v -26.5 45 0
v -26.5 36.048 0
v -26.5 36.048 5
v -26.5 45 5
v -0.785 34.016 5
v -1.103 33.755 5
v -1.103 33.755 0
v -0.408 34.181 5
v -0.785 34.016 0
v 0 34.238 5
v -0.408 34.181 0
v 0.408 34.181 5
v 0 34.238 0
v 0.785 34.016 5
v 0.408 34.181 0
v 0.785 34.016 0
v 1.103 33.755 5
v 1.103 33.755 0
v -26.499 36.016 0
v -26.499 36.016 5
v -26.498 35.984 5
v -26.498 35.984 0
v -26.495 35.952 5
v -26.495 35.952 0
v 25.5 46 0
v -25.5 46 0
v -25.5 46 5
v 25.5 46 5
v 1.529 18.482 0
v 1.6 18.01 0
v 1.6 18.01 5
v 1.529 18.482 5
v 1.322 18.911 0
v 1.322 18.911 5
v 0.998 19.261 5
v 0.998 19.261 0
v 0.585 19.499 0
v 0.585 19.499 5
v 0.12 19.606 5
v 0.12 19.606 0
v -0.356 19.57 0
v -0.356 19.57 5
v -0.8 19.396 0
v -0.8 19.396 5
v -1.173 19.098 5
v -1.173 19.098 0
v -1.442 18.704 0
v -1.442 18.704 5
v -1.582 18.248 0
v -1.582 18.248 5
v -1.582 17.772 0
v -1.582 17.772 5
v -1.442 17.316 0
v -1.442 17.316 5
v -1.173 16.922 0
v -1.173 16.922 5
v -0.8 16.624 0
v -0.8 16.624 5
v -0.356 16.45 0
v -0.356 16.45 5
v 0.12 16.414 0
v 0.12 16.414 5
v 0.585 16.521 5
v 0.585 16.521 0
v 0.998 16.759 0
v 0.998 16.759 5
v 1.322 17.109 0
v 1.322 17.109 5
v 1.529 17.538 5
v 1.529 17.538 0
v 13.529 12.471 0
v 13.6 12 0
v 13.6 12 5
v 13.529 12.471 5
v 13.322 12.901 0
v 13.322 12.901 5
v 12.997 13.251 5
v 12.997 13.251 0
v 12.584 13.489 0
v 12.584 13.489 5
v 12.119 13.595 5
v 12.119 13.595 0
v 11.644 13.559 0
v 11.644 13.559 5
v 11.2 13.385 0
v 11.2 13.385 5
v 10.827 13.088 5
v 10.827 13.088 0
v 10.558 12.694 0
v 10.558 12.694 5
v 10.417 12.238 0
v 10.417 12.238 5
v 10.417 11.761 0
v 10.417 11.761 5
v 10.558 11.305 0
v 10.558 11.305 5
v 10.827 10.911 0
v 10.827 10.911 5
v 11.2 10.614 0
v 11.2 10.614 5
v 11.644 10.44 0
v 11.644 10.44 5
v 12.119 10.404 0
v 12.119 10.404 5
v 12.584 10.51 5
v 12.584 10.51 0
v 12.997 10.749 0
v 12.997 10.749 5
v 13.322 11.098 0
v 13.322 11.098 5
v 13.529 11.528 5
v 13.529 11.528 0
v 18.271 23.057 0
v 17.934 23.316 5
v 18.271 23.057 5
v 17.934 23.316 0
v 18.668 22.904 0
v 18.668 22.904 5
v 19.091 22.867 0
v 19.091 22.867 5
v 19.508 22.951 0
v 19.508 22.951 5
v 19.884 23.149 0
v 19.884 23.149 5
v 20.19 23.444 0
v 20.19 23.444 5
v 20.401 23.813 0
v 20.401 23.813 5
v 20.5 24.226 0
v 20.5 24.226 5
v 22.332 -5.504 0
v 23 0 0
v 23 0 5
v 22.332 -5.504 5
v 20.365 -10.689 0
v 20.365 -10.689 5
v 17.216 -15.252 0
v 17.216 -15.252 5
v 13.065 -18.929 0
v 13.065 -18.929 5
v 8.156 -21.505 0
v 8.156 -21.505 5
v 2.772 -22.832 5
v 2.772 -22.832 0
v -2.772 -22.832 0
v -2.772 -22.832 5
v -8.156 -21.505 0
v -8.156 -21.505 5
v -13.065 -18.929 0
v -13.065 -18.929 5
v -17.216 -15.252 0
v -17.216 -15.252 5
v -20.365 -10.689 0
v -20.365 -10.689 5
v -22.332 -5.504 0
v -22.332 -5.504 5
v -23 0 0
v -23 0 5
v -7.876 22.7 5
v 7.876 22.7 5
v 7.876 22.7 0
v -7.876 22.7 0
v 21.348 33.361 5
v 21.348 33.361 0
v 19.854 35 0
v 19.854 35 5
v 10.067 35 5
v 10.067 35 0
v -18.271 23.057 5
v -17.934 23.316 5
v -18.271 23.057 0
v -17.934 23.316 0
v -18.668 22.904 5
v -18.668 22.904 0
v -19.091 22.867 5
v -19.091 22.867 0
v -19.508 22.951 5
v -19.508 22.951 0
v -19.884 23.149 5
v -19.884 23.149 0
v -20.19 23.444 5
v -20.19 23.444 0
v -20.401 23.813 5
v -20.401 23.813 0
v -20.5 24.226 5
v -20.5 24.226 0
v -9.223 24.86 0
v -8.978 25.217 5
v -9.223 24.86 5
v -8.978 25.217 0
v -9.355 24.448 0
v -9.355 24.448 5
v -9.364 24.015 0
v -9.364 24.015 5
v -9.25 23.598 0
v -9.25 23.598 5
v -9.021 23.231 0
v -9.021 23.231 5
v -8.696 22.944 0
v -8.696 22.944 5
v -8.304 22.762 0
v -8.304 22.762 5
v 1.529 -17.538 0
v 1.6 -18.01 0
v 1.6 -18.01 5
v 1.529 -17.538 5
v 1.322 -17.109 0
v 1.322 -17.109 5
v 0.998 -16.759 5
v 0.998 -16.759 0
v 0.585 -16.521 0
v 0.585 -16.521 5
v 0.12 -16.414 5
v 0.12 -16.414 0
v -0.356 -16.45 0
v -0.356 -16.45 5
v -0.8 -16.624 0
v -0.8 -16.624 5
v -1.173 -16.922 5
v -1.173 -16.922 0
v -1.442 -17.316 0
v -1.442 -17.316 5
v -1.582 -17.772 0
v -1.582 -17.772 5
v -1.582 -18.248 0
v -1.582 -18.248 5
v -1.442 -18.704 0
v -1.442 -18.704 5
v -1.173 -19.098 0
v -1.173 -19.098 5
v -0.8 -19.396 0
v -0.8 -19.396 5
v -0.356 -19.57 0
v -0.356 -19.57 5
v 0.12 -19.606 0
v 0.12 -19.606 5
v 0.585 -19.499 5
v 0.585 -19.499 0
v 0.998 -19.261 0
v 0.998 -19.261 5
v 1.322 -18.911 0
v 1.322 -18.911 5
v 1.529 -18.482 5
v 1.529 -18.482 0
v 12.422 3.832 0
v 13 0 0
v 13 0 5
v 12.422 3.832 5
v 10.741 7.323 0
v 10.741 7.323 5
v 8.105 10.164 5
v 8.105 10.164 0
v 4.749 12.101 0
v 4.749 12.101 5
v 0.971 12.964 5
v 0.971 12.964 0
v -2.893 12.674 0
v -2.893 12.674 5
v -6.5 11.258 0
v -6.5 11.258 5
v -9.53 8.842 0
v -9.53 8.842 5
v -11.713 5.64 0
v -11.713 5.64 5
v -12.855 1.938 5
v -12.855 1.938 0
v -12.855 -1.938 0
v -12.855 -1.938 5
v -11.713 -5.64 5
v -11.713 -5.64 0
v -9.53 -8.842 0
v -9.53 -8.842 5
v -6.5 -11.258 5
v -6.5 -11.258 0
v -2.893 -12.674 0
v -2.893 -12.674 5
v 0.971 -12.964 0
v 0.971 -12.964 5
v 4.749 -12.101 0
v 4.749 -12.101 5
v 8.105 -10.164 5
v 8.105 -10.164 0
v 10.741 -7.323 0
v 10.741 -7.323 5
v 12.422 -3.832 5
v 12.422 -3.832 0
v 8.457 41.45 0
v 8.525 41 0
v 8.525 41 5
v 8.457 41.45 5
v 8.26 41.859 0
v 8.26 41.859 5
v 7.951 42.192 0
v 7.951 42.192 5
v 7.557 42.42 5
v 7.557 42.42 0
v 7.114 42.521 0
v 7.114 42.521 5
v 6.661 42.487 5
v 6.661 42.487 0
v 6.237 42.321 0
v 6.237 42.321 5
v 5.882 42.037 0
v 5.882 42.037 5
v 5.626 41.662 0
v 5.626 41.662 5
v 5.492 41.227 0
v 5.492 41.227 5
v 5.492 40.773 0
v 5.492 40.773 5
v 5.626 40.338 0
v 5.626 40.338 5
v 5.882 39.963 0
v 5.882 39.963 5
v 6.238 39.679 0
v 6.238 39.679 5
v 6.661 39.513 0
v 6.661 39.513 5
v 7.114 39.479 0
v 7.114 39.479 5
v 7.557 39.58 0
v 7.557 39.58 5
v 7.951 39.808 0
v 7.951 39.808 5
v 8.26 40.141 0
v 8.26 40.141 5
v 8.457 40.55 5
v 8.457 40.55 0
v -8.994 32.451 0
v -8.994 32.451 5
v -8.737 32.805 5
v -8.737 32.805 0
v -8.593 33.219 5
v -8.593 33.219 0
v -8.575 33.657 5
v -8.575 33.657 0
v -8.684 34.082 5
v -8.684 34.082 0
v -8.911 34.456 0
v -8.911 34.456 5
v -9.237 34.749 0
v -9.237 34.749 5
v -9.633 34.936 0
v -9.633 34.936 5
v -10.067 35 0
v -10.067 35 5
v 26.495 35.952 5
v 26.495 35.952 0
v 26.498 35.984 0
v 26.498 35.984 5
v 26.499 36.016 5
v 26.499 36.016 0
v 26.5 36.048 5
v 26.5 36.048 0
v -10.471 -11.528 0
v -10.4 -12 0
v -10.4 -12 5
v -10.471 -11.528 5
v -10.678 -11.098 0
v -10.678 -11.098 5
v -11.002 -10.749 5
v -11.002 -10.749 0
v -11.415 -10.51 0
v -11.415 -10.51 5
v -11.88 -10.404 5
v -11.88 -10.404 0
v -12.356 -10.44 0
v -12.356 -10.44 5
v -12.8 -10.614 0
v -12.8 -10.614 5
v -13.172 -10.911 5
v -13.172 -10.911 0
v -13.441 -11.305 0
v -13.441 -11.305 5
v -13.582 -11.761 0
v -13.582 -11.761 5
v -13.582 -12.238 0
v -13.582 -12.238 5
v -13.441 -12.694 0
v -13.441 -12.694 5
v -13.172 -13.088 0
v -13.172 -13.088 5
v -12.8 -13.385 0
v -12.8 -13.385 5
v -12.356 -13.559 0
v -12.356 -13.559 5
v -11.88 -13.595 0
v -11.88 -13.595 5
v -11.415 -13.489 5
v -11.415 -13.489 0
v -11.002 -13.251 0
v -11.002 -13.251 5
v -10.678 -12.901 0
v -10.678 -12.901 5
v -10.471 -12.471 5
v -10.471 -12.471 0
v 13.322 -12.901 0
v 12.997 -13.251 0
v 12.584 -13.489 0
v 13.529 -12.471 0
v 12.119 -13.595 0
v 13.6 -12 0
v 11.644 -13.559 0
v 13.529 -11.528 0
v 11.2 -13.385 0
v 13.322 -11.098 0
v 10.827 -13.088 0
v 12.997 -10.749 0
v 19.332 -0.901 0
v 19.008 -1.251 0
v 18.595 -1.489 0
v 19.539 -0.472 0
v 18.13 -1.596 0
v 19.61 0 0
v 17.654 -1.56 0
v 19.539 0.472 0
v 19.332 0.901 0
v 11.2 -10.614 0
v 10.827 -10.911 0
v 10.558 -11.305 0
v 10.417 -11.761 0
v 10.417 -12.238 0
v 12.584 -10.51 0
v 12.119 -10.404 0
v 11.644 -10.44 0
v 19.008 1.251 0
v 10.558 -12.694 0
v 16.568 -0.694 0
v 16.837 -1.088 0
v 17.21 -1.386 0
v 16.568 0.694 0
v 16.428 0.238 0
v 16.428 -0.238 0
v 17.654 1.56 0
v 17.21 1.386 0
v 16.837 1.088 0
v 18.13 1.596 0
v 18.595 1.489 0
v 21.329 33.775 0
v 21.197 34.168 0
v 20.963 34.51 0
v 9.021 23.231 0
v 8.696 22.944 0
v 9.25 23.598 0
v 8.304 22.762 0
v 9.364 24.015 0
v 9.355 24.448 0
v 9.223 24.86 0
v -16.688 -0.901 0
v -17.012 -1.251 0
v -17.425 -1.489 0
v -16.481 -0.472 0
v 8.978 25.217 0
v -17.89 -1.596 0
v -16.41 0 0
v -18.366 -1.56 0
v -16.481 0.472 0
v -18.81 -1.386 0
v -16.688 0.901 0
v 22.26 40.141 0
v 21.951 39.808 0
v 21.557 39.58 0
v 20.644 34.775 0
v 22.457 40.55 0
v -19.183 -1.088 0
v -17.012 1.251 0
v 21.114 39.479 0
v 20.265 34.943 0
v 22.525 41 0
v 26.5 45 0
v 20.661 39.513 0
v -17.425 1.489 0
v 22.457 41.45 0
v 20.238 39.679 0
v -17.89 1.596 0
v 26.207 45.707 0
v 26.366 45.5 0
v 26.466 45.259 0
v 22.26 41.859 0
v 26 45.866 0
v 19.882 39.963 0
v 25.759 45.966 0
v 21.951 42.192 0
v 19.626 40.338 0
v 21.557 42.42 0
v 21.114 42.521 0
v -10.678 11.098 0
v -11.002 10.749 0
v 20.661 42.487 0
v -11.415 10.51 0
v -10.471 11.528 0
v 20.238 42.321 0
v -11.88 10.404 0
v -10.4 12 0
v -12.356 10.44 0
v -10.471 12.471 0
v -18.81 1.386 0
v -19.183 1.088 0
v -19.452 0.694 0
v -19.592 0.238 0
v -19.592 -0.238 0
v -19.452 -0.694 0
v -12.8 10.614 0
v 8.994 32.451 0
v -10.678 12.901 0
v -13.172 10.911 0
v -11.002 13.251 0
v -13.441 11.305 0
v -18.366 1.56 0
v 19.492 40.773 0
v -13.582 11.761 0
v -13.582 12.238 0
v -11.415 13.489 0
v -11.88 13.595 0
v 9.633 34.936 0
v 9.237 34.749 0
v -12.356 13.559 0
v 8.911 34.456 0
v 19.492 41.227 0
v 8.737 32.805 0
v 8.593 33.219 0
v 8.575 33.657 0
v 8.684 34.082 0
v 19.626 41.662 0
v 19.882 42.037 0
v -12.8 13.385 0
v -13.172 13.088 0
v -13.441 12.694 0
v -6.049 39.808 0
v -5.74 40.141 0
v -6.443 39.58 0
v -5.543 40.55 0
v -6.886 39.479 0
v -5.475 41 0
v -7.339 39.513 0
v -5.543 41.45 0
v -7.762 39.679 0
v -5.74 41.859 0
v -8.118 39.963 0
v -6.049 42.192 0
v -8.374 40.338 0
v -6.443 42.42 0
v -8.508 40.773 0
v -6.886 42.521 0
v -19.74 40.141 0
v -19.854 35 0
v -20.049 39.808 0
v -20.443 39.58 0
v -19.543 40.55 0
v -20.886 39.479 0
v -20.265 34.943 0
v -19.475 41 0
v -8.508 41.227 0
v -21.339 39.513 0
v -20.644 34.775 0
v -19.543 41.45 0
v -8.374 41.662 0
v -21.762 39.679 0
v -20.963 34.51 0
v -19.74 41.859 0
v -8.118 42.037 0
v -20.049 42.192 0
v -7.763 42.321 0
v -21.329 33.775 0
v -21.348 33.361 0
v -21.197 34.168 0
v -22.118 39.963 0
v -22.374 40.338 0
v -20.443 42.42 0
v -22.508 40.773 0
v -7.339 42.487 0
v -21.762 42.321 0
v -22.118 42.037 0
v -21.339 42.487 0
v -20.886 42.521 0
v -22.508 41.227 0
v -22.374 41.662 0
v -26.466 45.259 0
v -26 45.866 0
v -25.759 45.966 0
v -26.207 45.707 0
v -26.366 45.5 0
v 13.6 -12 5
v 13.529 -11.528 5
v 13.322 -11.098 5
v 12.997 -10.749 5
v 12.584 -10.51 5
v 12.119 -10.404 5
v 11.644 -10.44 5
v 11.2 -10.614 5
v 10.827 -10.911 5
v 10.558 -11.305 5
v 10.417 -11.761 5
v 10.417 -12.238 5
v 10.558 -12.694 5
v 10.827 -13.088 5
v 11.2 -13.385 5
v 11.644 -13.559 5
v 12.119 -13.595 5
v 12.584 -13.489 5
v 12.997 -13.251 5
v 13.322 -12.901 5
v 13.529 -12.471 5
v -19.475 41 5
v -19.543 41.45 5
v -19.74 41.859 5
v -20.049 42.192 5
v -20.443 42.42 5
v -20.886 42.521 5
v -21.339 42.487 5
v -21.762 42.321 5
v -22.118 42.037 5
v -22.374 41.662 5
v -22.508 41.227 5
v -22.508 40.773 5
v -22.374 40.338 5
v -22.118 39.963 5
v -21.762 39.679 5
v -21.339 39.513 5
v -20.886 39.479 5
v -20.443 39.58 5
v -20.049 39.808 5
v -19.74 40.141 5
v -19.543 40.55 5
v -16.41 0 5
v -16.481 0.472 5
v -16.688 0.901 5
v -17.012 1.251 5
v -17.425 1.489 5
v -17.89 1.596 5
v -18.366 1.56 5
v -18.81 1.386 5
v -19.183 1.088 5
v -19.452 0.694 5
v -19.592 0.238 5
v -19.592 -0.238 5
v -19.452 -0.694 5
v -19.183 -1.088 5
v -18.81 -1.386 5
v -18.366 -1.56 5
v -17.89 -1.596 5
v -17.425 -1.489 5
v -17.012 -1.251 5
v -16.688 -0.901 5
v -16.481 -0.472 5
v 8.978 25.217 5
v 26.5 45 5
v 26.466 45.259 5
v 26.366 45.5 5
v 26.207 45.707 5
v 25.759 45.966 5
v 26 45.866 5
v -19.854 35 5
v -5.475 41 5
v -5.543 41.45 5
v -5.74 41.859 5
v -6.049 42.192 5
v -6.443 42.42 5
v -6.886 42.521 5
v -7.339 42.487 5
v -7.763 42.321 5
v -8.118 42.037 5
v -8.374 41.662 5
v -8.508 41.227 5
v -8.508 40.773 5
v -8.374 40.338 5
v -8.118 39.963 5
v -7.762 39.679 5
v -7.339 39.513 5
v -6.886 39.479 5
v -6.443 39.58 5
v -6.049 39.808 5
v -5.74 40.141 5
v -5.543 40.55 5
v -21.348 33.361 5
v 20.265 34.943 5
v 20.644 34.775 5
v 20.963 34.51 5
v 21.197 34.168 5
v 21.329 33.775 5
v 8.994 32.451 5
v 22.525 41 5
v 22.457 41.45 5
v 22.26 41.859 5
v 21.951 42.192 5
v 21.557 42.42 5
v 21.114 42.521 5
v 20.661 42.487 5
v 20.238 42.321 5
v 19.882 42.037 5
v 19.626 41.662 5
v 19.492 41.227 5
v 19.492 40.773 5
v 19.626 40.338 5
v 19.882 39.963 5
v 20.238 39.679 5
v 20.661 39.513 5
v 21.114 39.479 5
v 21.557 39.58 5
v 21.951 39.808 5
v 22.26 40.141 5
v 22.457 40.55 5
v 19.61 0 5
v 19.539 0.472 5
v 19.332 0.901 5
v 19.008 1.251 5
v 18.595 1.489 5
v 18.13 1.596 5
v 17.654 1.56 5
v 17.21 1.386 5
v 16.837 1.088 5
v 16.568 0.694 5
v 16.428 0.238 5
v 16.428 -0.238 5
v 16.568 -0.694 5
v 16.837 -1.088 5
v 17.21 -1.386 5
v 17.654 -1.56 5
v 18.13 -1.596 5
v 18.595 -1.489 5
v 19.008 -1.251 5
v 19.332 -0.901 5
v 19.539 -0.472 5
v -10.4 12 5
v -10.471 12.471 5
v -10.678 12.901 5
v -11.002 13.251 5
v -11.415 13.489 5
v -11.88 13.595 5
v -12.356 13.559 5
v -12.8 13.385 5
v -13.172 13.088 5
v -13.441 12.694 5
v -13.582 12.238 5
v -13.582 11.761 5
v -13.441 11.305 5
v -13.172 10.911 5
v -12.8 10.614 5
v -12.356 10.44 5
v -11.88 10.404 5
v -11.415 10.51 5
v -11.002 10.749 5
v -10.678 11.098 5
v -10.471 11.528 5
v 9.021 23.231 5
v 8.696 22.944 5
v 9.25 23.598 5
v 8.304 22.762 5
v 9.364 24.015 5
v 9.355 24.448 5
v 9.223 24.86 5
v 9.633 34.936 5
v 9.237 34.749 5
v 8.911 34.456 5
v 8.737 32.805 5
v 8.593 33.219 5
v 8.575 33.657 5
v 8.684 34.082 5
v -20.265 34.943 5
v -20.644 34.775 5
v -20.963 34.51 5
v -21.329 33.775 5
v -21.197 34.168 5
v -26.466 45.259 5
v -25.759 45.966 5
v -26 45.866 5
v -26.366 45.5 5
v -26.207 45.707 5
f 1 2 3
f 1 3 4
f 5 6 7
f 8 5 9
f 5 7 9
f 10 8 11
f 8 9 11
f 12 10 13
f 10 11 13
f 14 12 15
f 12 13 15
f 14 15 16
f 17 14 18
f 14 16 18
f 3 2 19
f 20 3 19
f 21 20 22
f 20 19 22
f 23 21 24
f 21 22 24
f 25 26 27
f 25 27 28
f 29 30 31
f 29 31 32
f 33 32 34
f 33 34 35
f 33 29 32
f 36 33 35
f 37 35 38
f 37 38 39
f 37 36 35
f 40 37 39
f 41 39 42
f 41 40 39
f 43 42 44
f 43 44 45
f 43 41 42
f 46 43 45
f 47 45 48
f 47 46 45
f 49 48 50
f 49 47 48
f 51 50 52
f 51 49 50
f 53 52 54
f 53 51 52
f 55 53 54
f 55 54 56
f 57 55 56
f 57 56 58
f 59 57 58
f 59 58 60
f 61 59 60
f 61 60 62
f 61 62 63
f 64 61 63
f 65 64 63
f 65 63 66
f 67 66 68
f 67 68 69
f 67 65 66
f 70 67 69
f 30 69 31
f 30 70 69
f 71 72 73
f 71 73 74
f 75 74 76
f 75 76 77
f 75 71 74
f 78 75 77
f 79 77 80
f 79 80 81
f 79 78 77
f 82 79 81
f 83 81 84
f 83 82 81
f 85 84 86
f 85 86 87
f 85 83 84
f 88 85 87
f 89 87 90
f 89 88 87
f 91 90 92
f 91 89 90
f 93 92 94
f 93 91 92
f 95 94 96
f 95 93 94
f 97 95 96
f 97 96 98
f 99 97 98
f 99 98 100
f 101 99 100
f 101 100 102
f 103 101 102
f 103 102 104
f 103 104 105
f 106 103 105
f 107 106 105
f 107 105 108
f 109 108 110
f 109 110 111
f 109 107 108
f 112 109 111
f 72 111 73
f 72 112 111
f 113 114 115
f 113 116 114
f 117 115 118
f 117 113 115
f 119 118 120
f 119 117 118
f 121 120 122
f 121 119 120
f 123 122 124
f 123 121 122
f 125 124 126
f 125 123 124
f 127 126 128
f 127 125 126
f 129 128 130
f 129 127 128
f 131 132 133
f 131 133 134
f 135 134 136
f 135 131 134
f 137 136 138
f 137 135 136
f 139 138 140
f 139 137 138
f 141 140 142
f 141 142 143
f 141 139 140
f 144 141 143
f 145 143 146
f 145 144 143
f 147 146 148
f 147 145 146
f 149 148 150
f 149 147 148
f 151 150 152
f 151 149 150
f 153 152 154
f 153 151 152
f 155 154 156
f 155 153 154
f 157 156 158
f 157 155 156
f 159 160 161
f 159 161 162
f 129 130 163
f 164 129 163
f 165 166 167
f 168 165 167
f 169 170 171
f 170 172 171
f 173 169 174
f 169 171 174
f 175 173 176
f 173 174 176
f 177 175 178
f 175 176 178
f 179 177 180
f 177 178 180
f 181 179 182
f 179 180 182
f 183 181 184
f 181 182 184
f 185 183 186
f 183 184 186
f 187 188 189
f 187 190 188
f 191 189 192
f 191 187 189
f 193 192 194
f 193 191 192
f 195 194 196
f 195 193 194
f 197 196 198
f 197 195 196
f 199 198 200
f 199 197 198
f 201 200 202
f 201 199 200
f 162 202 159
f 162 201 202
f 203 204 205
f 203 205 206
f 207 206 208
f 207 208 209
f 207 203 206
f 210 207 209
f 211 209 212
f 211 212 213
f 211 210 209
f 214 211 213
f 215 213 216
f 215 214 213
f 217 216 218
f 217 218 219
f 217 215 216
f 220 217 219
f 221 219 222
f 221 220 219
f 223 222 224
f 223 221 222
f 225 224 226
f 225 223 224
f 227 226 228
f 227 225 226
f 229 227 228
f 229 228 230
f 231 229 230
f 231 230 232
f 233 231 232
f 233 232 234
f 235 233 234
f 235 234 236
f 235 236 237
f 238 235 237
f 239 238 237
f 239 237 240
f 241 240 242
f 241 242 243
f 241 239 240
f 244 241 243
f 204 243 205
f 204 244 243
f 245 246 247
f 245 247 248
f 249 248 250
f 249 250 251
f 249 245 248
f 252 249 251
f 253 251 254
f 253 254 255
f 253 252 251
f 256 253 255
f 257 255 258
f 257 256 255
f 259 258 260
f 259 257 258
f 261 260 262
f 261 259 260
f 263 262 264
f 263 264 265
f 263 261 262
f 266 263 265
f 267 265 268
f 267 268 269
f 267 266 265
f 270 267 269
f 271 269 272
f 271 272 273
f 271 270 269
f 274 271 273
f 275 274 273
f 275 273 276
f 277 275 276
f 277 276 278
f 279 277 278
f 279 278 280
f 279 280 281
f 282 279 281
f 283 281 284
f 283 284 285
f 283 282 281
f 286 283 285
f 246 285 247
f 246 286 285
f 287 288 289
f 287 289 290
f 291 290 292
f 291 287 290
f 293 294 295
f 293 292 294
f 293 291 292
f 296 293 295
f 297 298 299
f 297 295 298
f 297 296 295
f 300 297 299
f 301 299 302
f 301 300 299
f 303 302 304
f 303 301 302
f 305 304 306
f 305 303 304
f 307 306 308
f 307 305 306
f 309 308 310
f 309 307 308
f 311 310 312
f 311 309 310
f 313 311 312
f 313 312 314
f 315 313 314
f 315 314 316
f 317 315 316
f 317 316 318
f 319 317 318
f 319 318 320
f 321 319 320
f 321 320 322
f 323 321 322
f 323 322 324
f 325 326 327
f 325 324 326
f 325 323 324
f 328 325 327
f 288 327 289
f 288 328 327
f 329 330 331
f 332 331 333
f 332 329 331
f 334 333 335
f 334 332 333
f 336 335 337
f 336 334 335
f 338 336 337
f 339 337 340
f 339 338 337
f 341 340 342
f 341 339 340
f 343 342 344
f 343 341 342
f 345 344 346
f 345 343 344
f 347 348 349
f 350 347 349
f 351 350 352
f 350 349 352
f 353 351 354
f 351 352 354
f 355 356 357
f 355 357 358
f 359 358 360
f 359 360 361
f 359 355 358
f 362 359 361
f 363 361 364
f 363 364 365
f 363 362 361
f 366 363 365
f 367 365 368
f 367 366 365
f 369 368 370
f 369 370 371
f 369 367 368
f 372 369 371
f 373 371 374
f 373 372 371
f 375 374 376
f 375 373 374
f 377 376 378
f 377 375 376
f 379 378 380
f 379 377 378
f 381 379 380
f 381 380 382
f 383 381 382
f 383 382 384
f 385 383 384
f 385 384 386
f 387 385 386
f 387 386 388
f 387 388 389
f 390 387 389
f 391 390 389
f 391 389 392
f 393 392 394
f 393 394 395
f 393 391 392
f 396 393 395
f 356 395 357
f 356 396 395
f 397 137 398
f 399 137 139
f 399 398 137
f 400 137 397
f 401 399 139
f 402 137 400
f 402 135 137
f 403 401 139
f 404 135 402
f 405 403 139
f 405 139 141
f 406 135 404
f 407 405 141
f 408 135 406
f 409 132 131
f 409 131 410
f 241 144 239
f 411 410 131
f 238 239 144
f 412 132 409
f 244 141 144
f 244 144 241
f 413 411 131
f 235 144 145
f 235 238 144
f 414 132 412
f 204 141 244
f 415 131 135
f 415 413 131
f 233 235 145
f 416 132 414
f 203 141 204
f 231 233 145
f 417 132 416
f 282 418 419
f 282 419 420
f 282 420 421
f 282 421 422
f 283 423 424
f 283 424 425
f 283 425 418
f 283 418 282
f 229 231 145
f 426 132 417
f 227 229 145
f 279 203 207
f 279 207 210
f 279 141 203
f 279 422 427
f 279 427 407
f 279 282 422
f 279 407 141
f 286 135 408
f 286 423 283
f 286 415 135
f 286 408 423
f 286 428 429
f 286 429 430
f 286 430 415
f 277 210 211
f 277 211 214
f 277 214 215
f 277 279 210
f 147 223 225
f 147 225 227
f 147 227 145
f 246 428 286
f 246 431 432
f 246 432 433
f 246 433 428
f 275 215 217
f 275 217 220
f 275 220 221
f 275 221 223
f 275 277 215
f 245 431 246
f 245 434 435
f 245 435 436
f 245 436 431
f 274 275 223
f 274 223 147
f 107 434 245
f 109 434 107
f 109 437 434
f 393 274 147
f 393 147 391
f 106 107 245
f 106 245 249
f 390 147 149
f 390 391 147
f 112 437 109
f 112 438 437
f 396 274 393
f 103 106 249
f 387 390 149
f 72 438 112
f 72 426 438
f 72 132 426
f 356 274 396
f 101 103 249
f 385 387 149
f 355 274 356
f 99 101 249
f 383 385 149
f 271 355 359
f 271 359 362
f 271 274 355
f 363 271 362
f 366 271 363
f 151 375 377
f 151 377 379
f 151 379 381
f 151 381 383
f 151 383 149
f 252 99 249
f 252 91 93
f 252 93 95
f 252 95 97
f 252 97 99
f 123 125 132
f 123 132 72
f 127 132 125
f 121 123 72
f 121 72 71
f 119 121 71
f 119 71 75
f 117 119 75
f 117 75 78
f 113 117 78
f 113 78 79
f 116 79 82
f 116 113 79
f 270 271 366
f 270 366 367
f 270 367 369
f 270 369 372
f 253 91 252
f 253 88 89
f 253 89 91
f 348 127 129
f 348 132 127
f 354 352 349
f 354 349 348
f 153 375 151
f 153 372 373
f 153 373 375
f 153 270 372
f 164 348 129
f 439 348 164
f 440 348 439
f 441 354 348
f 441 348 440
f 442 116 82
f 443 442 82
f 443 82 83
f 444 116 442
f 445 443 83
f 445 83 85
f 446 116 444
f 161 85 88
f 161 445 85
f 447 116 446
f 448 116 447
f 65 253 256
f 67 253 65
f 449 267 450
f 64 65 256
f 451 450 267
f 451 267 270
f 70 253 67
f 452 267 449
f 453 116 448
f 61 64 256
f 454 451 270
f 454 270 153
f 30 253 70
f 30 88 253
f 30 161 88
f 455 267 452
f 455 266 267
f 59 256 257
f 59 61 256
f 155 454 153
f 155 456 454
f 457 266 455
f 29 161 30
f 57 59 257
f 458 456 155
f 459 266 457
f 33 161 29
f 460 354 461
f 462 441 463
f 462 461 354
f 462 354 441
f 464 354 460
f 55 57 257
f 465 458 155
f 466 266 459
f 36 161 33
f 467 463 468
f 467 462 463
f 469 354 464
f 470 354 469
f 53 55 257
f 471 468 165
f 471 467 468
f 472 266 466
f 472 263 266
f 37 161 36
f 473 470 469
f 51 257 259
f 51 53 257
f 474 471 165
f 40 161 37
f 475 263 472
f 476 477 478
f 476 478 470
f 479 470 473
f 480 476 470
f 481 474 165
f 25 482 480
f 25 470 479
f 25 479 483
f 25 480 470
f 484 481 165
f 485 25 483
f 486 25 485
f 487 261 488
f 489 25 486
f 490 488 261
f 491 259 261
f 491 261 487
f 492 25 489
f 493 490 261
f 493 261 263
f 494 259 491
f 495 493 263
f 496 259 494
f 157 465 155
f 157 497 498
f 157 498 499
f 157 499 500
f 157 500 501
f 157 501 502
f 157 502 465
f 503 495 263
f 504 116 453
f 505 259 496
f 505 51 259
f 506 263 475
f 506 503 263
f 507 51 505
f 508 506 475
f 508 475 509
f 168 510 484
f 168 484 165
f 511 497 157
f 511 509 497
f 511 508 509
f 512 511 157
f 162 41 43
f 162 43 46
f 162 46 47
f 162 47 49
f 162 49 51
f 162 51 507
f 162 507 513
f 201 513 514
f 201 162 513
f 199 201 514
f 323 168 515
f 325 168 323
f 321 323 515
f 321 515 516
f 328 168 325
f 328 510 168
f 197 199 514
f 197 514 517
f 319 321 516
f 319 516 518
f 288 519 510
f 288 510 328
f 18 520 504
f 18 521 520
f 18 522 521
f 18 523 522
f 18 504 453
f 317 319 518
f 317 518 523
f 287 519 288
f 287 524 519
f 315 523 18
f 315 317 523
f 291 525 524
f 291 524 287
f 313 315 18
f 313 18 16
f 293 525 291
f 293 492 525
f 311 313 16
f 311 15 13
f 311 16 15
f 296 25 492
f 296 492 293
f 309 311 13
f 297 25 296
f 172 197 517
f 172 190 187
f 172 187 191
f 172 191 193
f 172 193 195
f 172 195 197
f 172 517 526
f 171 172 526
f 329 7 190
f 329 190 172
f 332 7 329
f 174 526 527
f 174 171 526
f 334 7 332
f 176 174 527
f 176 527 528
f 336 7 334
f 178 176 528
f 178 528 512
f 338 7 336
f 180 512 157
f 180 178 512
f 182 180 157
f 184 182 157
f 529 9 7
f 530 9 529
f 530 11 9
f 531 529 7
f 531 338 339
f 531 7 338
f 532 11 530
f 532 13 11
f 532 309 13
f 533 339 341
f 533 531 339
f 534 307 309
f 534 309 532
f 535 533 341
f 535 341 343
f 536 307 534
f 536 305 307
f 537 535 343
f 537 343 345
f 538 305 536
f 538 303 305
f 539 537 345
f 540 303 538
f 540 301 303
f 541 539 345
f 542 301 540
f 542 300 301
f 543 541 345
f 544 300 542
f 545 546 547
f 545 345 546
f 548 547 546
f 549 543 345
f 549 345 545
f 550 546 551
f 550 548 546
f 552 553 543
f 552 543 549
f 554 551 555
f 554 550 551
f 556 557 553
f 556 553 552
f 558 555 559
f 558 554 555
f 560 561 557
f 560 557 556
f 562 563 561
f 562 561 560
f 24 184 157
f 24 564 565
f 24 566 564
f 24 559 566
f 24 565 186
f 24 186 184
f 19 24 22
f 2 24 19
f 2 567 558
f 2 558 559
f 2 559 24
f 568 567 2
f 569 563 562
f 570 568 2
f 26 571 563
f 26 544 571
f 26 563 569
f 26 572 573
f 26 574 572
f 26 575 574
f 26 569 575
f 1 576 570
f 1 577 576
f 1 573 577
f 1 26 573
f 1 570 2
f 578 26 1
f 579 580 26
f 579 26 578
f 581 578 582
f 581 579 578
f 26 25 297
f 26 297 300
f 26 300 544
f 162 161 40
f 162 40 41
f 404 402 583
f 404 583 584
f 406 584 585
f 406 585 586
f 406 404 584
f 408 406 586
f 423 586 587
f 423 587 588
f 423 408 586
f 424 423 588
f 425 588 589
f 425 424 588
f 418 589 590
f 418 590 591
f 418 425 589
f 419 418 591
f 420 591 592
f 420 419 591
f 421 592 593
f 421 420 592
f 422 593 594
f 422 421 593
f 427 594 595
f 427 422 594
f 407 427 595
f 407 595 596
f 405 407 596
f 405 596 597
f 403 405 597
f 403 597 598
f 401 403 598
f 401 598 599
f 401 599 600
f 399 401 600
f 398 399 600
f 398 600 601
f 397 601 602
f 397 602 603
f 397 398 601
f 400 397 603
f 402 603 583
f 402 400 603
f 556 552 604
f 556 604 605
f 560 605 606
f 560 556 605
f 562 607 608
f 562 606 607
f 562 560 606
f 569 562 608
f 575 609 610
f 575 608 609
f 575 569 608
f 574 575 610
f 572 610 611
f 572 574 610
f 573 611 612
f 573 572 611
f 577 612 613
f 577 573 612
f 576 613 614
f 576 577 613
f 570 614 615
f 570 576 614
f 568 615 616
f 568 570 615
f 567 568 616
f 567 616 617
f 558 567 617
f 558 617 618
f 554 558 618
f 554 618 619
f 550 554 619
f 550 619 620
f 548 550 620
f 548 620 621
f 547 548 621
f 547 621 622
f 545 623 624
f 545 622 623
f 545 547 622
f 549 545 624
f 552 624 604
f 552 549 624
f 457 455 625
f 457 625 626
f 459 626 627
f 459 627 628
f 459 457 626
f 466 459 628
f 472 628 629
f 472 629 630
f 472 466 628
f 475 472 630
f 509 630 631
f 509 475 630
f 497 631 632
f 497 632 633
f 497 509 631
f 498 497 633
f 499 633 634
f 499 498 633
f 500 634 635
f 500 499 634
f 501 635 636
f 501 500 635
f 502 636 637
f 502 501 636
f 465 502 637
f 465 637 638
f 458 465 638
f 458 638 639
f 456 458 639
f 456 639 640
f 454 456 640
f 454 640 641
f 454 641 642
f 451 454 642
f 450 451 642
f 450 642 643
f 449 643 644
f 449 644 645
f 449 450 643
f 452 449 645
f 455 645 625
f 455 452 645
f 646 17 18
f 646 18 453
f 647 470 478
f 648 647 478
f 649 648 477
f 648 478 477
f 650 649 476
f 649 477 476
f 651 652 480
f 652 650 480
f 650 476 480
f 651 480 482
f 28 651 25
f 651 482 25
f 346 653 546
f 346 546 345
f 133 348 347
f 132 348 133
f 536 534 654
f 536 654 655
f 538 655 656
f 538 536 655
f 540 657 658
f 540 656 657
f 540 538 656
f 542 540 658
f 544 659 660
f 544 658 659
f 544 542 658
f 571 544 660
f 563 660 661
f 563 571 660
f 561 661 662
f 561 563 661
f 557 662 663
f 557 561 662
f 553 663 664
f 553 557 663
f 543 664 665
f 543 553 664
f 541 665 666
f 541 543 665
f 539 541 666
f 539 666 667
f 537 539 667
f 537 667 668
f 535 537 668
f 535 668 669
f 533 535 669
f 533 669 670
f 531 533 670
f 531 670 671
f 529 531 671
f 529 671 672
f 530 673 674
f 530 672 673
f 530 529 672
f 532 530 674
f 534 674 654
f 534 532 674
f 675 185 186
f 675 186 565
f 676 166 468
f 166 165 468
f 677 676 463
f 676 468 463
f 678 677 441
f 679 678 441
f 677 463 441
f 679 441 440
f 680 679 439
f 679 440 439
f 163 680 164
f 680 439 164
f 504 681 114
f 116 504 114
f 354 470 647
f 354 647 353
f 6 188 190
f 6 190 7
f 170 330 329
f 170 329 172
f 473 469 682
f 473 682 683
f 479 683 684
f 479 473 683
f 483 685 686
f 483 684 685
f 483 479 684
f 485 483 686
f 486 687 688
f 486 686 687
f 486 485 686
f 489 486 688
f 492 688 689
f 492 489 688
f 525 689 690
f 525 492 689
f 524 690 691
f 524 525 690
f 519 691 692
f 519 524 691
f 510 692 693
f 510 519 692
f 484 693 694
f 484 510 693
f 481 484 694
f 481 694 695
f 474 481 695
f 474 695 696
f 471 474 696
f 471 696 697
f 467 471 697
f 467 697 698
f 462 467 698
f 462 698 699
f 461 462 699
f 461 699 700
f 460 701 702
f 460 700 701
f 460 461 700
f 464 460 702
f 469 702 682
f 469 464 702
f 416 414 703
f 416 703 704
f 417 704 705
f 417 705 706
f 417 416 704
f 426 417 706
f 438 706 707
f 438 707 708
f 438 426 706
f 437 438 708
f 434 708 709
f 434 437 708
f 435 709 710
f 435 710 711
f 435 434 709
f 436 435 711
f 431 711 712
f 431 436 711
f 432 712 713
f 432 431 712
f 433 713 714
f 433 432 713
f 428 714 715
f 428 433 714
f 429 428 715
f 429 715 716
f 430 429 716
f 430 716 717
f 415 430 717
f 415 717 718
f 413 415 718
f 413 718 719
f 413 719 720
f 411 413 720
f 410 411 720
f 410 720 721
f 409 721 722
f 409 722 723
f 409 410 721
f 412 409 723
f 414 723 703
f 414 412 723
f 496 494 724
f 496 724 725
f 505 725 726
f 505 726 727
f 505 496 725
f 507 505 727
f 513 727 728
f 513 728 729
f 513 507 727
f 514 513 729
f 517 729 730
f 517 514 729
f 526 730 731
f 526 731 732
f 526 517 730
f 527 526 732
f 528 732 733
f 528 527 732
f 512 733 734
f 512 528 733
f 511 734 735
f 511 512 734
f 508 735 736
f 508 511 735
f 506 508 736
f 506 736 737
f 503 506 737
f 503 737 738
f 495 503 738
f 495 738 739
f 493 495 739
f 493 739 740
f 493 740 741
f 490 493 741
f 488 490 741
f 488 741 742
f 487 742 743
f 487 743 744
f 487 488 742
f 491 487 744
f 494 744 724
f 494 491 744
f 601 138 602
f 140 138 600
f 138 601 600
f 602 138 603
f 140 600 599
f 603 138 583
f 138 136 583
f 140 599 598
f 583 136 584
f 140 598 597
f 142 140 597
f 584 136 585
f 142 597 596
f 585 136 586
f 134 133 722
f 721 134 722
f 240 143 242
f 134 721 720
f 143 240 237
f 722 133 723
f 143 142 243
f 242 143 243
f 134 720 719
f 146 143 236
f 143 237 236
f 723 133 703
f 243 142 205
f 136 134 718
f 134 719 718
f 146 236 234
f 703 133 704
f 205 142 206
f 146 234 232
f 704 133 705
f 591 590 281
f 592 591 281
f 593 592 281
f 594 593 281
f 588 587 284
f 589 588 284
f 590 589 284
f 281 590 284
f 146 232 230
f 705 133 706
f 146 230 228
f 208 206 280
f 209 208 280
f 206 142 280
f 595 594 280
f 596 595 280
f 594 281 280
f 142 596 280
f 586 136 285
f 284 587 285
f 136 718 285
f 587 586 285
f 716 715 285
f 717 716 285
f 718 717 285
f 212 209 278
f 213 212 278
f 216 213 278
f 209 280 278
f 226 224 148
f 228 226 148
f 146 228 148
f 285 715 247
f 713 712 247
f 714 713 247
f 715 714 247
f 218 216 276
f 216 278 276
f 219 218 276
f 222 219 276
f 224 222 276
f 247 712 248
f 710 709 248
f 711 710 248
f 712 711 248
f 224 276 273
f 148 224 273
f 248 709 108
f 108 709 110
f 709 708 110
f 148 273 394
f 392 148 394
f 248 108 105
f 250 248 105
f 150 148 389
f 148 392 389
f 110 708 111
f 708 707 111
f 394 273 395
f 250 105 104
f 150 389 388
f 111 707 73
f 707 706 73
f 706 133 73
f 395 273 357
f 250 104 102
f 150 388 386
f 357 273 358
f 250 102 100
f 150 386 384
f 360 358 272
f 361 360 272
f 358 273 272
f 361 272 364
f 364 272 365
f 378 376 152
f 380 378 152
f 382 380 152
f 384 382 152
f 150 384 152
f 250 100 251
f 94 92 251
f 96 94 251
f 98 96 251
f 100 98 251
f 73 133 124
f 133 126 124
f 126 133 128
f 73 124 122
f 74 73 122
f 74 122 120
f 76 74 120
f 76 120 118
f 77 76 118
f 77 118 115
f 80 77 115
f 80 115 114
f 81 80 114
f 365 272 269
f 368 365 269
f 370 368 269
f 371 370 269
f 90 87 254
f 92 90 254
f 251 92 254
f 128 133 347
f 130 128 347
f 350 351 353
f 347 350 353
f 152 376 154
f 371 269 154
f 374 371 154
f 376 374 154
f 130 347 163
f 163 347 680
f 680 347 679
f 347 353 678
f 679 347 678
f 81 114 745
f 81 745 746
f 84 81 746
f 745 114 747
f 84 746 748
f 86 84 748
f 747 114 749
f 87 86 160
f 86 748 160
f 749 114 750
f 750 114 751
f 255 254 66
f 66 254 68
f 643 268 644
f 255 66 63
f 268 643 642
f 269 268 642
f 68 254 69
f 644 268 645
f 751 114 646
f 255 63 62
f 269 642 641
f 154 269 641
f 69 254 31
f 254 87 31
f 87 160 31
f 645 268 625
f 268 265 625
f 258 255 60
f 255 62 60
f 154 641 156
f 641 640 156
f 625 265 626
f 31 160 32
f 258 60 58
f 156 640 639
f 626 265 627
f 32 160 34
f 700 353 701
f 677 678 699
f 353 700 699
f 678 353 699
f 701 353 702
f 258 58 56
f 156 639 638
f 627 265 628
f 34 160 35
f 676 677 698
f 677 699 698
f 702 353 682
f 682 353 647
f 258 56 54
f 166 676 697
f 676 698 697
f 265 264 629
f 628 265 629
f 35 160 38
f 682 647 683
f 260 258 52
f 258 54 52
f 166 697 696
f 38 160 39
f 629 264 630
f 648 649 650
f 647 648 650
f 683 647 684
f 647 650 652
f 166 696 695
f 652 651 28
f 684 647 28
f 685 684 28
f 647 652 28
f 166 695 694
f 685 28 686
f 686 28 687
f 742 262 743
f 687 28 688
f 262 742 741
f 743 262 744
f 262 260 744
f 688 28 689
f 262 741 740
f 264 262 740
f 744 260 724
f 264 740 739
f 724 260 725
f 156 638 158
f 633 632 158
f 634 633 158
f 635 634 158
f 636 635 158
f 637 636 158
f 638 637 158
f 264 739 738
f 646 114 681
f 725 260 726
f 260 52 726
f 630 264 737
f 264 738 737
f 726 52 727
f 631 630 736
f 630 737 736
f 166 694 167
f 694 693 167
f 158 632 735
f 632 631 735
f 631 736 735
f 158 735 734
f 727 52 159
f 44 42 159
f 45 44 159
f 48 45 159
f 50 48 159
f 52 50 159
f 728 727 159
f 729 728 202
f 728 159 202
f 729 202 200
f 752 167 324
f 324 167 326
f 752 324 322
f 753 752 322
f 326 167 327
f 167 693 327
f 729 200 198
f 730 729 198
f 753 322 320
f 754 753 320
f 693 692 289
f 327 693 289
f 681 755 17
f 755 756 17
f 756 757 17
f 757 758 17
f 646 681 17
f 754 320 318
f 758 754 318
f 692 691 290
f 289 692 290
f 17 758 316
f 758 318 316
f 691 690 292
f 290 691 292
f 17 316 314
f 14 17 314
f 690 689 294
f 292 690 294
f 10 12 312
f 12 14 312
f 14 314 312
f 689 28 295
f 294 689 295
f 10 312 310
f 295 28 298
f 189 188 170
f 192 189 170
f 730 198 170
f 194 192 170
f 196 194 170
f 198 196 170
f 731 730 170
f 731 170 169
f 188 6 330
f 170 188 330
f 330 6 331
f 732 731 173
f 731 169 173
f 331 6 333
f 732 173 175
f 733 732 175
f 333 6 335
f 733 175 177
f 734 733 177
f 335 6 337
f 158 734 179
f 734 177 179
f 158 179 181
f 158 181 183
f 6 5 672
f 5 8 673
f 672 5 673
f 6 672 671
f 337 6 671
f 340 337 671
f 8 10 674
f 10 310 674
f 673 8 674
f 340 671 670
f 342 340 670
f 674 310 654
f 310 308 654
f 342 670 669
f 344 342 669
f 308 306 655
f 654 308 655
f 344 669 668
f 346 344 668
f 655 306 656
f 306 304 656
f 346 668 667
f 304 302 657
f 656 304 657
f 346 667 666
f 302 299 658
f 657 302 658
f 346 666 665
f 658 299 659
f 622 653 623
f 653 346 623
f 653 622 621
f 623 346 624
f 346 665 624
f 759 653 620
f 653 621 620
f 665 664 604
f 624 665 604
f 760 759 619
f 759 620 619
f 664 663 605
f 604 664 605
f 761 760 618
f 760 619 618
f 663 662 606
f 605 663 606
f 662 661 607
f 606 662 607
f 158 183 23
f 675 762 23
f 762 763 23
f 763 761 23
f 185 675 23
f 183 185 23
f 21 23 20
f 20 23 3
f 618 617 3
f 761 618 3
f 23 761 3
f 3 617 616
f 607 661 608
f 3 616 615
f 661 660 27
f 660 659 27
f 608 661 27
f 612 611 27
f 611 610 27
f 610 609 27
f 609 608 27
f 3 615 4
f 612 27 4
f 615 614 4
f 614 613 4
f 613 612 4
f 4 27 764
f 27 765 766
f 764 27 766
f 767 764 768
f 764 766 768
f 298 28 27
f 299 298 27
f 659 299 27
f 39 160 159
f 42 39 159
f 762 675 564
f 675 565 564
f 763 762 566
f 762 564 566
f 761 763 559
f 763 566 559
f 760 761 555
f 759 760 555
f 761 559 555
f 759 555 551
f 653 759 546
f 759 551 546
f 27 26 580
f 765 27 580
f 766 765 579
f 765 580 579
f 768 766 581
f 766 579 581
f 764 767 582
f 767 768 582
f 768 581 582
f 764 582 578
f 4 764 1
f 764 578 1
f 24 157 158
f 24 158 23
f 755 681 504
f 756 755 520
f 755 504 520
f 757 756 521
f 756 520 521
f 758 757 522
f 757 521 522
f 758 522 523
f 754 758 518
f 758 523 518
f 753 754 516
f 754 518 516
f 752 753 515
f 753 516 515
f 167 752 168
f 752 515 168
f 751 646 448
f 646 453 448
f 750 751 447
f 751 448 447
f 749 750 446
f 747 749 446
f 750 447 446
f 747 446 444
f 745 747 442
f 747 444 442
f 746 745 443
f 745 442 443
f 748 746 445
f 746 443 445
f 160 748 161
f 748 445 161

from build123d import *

# Parameters (mm, degrees)
EXTRUDE_2_DEPTH          = 5
FILLET_3_R               = 1
SKETCH_3_R               = 13
SKETCH_3_R_2             = 1.6
CUT_EXTRUDE_5_DEPTH      = 5
CUT_EXTRUDE_6_DEPTH      = 54.322134241
CUT_EXTRUDE_6_DEPTH_BACK = 54.322134241
SKETCH_4_R               = 1.525
CUT_EXTRUDE_7_DEPTH      = 10
FILLET_4_R               = 1.5


with BuildPart() as part:
    # 草圖2 → 填料-伸長2 (new body)
    with BuildSketch(Plane.XY):
        with BuildLine():
            Line((-26.5, 46), (26.5, 46))
            Line((26.5, 46), (26.5, 36))
            Line((26.5, 36), (23, 0))
            ThreePointArc((23, 0), (0, -23), (-23, 0))
            Line((-23, 0), (-26.5, 36))
            Line((-26.5, 36), (-26.5, 46))
        make_face()
    extrude(amount=EXTRUDE_2_DEPTH)

    # 圓角3
    # the kernel refuses this fillet: 1 mm, written as the material it takes off along each edge
    with BuildSketch(Plane(origin=(-26.5, 46, -2.5), x_dir=(0, -1, 0), z_dir=(0, 0, 1)), Plane(origin=(26.5, 46, -2.5), x_dir=(-1, 0, 0), z_dir=(0, 0, 1))) as fillet_3_piece_1:
        with BuildLine():
            CenterArc((FILLET_3_R, FILLET_3_R), FILLET_3_R, 180, 90)
            Line((0, FILLET_3_R), (0, 0))
            Line((0, 0), (FILLET_3_R, 0))
        make_face()
    extrude(amount=10, mode=Mode.SUBTRACT)
    with BuildSketch(Plane(origin=(26.5, 36, -0.121241952), x_dir=(0, 1, 0), z_dir=(0, 0, 1)), Plane(origin=(-26.5, 36, -0.121241952), x_dir=(0.0967659740606196, -0.9953071617667079, 0), z_dir=(0, 0, 1))) as fillet_3_piece_2:
        with BuildLine():
            CenterArc((FILLET_3_R * 0.0484967808039, FILLET_3_R), FILLET_3_R, 264.447028967, 5.552971033)
            Line((-FILLET_3_R * 0.0482691932568, FILLET_3_R * 0.0046928382333), (0, 0))
            Line((0, 0), (FILLET_3_R * 0.0484967808039, 0))
        make_face()
    extrude(amount=5.242483904, mode=Mode.SUBTRACT)

    # 草圖3 → 除料-伸長5 (cut)
    with BuildSketch(Plane.XY):
        Circle(SKETCH_3_R)
        with Locations((18.009998301, 0)):
            Circle(SKETCH_3_R_2)
        with Locations((0, -18.009998301)):
            Circle(SKETCH_3_R_2)
        with Locations((-18.009998301, 0)):
            Circle(SKETCH_3_R_2)
        with Locations((0, 18.009998301)):
            Circle(SKETCH_3_R_2)
        with Locations((11.999602077, 11.999602077)):
            Circle(SKETCH_3_R_2)
        with Locations((11.999602077, -11.999602077)):
            Circle(SKETCH_3_R_2)
        with Locations((-11.999602077, -11.999602077)):
            Circle(SKETCH_3_R_2)
        with Locations((-11.999602077, 11.999602077)):
            Circle(SKETCH_3_R_2)
    extrude(amount=CUT_EXTRUDE_5_DEPTH, mode=Mode.SUBTRACT)

    # 草圖4 → 除料-伸長6 (cut, two sides: drawn at the far end of the back side and taken through both)
    with BuildSketch(Plane.XY.offset(-CUT_EXTRUDE_6_DEPTH_BACK)):
        with Locations((21, 41)):
            Circle(SKETCH_4_R)
        with Locations((7, 41)):
            Circle(SKETCH_4_R)
        with Locations((-7, 41)):
            Circle(SKETCH_4_R)
        with Locations((-21, 41)):
            Circle(SKETCH_4_R)
    extrude(amount=CUT_EXTRUDE_6_DEPTH + CUT_EXTRUDE_6_DEPTH_BACK, mode=Mode.SUBTRACT)

    # 草圖5 → 除料-伸長7 (cut)
    with BuildSketch(Plane.XY.offset(5)):
        Polygon((-21.5, 35), (-6.5, 35), (-20.2, 21), align=None)
        Polygon((11.3, 22.7), (-11.3, 22.7), (0, 34.95), align=None)
        Polygon((6.5, 35), (20.2, 21), (21.5, 35), align=None)
    extrude(amount=-CUT_EXTRUDE_7_DEPTH, mode=Mode.SUBTRACT)

    # 圓角4
    fillet_4_edges = [part.edges().sort_by_distance(p)[0] for p in [
        (6.5, 35, 2.5),
        (21.5, 35, 2.5),
        (20.2, 21, 2.5),
        (-11.3, 22.7, 2.5),
        (0, 34.95, 2.5),
        (11.3, 22.7, 2.5),
        (-20.2, 21, 2.5),
        (-21.5, 35, 2.5),
        (-6.5, 35, 2.5),
    ]]
    fillet(fillet_4_edges, radius=FILLET_4_R)


solid = part.part
